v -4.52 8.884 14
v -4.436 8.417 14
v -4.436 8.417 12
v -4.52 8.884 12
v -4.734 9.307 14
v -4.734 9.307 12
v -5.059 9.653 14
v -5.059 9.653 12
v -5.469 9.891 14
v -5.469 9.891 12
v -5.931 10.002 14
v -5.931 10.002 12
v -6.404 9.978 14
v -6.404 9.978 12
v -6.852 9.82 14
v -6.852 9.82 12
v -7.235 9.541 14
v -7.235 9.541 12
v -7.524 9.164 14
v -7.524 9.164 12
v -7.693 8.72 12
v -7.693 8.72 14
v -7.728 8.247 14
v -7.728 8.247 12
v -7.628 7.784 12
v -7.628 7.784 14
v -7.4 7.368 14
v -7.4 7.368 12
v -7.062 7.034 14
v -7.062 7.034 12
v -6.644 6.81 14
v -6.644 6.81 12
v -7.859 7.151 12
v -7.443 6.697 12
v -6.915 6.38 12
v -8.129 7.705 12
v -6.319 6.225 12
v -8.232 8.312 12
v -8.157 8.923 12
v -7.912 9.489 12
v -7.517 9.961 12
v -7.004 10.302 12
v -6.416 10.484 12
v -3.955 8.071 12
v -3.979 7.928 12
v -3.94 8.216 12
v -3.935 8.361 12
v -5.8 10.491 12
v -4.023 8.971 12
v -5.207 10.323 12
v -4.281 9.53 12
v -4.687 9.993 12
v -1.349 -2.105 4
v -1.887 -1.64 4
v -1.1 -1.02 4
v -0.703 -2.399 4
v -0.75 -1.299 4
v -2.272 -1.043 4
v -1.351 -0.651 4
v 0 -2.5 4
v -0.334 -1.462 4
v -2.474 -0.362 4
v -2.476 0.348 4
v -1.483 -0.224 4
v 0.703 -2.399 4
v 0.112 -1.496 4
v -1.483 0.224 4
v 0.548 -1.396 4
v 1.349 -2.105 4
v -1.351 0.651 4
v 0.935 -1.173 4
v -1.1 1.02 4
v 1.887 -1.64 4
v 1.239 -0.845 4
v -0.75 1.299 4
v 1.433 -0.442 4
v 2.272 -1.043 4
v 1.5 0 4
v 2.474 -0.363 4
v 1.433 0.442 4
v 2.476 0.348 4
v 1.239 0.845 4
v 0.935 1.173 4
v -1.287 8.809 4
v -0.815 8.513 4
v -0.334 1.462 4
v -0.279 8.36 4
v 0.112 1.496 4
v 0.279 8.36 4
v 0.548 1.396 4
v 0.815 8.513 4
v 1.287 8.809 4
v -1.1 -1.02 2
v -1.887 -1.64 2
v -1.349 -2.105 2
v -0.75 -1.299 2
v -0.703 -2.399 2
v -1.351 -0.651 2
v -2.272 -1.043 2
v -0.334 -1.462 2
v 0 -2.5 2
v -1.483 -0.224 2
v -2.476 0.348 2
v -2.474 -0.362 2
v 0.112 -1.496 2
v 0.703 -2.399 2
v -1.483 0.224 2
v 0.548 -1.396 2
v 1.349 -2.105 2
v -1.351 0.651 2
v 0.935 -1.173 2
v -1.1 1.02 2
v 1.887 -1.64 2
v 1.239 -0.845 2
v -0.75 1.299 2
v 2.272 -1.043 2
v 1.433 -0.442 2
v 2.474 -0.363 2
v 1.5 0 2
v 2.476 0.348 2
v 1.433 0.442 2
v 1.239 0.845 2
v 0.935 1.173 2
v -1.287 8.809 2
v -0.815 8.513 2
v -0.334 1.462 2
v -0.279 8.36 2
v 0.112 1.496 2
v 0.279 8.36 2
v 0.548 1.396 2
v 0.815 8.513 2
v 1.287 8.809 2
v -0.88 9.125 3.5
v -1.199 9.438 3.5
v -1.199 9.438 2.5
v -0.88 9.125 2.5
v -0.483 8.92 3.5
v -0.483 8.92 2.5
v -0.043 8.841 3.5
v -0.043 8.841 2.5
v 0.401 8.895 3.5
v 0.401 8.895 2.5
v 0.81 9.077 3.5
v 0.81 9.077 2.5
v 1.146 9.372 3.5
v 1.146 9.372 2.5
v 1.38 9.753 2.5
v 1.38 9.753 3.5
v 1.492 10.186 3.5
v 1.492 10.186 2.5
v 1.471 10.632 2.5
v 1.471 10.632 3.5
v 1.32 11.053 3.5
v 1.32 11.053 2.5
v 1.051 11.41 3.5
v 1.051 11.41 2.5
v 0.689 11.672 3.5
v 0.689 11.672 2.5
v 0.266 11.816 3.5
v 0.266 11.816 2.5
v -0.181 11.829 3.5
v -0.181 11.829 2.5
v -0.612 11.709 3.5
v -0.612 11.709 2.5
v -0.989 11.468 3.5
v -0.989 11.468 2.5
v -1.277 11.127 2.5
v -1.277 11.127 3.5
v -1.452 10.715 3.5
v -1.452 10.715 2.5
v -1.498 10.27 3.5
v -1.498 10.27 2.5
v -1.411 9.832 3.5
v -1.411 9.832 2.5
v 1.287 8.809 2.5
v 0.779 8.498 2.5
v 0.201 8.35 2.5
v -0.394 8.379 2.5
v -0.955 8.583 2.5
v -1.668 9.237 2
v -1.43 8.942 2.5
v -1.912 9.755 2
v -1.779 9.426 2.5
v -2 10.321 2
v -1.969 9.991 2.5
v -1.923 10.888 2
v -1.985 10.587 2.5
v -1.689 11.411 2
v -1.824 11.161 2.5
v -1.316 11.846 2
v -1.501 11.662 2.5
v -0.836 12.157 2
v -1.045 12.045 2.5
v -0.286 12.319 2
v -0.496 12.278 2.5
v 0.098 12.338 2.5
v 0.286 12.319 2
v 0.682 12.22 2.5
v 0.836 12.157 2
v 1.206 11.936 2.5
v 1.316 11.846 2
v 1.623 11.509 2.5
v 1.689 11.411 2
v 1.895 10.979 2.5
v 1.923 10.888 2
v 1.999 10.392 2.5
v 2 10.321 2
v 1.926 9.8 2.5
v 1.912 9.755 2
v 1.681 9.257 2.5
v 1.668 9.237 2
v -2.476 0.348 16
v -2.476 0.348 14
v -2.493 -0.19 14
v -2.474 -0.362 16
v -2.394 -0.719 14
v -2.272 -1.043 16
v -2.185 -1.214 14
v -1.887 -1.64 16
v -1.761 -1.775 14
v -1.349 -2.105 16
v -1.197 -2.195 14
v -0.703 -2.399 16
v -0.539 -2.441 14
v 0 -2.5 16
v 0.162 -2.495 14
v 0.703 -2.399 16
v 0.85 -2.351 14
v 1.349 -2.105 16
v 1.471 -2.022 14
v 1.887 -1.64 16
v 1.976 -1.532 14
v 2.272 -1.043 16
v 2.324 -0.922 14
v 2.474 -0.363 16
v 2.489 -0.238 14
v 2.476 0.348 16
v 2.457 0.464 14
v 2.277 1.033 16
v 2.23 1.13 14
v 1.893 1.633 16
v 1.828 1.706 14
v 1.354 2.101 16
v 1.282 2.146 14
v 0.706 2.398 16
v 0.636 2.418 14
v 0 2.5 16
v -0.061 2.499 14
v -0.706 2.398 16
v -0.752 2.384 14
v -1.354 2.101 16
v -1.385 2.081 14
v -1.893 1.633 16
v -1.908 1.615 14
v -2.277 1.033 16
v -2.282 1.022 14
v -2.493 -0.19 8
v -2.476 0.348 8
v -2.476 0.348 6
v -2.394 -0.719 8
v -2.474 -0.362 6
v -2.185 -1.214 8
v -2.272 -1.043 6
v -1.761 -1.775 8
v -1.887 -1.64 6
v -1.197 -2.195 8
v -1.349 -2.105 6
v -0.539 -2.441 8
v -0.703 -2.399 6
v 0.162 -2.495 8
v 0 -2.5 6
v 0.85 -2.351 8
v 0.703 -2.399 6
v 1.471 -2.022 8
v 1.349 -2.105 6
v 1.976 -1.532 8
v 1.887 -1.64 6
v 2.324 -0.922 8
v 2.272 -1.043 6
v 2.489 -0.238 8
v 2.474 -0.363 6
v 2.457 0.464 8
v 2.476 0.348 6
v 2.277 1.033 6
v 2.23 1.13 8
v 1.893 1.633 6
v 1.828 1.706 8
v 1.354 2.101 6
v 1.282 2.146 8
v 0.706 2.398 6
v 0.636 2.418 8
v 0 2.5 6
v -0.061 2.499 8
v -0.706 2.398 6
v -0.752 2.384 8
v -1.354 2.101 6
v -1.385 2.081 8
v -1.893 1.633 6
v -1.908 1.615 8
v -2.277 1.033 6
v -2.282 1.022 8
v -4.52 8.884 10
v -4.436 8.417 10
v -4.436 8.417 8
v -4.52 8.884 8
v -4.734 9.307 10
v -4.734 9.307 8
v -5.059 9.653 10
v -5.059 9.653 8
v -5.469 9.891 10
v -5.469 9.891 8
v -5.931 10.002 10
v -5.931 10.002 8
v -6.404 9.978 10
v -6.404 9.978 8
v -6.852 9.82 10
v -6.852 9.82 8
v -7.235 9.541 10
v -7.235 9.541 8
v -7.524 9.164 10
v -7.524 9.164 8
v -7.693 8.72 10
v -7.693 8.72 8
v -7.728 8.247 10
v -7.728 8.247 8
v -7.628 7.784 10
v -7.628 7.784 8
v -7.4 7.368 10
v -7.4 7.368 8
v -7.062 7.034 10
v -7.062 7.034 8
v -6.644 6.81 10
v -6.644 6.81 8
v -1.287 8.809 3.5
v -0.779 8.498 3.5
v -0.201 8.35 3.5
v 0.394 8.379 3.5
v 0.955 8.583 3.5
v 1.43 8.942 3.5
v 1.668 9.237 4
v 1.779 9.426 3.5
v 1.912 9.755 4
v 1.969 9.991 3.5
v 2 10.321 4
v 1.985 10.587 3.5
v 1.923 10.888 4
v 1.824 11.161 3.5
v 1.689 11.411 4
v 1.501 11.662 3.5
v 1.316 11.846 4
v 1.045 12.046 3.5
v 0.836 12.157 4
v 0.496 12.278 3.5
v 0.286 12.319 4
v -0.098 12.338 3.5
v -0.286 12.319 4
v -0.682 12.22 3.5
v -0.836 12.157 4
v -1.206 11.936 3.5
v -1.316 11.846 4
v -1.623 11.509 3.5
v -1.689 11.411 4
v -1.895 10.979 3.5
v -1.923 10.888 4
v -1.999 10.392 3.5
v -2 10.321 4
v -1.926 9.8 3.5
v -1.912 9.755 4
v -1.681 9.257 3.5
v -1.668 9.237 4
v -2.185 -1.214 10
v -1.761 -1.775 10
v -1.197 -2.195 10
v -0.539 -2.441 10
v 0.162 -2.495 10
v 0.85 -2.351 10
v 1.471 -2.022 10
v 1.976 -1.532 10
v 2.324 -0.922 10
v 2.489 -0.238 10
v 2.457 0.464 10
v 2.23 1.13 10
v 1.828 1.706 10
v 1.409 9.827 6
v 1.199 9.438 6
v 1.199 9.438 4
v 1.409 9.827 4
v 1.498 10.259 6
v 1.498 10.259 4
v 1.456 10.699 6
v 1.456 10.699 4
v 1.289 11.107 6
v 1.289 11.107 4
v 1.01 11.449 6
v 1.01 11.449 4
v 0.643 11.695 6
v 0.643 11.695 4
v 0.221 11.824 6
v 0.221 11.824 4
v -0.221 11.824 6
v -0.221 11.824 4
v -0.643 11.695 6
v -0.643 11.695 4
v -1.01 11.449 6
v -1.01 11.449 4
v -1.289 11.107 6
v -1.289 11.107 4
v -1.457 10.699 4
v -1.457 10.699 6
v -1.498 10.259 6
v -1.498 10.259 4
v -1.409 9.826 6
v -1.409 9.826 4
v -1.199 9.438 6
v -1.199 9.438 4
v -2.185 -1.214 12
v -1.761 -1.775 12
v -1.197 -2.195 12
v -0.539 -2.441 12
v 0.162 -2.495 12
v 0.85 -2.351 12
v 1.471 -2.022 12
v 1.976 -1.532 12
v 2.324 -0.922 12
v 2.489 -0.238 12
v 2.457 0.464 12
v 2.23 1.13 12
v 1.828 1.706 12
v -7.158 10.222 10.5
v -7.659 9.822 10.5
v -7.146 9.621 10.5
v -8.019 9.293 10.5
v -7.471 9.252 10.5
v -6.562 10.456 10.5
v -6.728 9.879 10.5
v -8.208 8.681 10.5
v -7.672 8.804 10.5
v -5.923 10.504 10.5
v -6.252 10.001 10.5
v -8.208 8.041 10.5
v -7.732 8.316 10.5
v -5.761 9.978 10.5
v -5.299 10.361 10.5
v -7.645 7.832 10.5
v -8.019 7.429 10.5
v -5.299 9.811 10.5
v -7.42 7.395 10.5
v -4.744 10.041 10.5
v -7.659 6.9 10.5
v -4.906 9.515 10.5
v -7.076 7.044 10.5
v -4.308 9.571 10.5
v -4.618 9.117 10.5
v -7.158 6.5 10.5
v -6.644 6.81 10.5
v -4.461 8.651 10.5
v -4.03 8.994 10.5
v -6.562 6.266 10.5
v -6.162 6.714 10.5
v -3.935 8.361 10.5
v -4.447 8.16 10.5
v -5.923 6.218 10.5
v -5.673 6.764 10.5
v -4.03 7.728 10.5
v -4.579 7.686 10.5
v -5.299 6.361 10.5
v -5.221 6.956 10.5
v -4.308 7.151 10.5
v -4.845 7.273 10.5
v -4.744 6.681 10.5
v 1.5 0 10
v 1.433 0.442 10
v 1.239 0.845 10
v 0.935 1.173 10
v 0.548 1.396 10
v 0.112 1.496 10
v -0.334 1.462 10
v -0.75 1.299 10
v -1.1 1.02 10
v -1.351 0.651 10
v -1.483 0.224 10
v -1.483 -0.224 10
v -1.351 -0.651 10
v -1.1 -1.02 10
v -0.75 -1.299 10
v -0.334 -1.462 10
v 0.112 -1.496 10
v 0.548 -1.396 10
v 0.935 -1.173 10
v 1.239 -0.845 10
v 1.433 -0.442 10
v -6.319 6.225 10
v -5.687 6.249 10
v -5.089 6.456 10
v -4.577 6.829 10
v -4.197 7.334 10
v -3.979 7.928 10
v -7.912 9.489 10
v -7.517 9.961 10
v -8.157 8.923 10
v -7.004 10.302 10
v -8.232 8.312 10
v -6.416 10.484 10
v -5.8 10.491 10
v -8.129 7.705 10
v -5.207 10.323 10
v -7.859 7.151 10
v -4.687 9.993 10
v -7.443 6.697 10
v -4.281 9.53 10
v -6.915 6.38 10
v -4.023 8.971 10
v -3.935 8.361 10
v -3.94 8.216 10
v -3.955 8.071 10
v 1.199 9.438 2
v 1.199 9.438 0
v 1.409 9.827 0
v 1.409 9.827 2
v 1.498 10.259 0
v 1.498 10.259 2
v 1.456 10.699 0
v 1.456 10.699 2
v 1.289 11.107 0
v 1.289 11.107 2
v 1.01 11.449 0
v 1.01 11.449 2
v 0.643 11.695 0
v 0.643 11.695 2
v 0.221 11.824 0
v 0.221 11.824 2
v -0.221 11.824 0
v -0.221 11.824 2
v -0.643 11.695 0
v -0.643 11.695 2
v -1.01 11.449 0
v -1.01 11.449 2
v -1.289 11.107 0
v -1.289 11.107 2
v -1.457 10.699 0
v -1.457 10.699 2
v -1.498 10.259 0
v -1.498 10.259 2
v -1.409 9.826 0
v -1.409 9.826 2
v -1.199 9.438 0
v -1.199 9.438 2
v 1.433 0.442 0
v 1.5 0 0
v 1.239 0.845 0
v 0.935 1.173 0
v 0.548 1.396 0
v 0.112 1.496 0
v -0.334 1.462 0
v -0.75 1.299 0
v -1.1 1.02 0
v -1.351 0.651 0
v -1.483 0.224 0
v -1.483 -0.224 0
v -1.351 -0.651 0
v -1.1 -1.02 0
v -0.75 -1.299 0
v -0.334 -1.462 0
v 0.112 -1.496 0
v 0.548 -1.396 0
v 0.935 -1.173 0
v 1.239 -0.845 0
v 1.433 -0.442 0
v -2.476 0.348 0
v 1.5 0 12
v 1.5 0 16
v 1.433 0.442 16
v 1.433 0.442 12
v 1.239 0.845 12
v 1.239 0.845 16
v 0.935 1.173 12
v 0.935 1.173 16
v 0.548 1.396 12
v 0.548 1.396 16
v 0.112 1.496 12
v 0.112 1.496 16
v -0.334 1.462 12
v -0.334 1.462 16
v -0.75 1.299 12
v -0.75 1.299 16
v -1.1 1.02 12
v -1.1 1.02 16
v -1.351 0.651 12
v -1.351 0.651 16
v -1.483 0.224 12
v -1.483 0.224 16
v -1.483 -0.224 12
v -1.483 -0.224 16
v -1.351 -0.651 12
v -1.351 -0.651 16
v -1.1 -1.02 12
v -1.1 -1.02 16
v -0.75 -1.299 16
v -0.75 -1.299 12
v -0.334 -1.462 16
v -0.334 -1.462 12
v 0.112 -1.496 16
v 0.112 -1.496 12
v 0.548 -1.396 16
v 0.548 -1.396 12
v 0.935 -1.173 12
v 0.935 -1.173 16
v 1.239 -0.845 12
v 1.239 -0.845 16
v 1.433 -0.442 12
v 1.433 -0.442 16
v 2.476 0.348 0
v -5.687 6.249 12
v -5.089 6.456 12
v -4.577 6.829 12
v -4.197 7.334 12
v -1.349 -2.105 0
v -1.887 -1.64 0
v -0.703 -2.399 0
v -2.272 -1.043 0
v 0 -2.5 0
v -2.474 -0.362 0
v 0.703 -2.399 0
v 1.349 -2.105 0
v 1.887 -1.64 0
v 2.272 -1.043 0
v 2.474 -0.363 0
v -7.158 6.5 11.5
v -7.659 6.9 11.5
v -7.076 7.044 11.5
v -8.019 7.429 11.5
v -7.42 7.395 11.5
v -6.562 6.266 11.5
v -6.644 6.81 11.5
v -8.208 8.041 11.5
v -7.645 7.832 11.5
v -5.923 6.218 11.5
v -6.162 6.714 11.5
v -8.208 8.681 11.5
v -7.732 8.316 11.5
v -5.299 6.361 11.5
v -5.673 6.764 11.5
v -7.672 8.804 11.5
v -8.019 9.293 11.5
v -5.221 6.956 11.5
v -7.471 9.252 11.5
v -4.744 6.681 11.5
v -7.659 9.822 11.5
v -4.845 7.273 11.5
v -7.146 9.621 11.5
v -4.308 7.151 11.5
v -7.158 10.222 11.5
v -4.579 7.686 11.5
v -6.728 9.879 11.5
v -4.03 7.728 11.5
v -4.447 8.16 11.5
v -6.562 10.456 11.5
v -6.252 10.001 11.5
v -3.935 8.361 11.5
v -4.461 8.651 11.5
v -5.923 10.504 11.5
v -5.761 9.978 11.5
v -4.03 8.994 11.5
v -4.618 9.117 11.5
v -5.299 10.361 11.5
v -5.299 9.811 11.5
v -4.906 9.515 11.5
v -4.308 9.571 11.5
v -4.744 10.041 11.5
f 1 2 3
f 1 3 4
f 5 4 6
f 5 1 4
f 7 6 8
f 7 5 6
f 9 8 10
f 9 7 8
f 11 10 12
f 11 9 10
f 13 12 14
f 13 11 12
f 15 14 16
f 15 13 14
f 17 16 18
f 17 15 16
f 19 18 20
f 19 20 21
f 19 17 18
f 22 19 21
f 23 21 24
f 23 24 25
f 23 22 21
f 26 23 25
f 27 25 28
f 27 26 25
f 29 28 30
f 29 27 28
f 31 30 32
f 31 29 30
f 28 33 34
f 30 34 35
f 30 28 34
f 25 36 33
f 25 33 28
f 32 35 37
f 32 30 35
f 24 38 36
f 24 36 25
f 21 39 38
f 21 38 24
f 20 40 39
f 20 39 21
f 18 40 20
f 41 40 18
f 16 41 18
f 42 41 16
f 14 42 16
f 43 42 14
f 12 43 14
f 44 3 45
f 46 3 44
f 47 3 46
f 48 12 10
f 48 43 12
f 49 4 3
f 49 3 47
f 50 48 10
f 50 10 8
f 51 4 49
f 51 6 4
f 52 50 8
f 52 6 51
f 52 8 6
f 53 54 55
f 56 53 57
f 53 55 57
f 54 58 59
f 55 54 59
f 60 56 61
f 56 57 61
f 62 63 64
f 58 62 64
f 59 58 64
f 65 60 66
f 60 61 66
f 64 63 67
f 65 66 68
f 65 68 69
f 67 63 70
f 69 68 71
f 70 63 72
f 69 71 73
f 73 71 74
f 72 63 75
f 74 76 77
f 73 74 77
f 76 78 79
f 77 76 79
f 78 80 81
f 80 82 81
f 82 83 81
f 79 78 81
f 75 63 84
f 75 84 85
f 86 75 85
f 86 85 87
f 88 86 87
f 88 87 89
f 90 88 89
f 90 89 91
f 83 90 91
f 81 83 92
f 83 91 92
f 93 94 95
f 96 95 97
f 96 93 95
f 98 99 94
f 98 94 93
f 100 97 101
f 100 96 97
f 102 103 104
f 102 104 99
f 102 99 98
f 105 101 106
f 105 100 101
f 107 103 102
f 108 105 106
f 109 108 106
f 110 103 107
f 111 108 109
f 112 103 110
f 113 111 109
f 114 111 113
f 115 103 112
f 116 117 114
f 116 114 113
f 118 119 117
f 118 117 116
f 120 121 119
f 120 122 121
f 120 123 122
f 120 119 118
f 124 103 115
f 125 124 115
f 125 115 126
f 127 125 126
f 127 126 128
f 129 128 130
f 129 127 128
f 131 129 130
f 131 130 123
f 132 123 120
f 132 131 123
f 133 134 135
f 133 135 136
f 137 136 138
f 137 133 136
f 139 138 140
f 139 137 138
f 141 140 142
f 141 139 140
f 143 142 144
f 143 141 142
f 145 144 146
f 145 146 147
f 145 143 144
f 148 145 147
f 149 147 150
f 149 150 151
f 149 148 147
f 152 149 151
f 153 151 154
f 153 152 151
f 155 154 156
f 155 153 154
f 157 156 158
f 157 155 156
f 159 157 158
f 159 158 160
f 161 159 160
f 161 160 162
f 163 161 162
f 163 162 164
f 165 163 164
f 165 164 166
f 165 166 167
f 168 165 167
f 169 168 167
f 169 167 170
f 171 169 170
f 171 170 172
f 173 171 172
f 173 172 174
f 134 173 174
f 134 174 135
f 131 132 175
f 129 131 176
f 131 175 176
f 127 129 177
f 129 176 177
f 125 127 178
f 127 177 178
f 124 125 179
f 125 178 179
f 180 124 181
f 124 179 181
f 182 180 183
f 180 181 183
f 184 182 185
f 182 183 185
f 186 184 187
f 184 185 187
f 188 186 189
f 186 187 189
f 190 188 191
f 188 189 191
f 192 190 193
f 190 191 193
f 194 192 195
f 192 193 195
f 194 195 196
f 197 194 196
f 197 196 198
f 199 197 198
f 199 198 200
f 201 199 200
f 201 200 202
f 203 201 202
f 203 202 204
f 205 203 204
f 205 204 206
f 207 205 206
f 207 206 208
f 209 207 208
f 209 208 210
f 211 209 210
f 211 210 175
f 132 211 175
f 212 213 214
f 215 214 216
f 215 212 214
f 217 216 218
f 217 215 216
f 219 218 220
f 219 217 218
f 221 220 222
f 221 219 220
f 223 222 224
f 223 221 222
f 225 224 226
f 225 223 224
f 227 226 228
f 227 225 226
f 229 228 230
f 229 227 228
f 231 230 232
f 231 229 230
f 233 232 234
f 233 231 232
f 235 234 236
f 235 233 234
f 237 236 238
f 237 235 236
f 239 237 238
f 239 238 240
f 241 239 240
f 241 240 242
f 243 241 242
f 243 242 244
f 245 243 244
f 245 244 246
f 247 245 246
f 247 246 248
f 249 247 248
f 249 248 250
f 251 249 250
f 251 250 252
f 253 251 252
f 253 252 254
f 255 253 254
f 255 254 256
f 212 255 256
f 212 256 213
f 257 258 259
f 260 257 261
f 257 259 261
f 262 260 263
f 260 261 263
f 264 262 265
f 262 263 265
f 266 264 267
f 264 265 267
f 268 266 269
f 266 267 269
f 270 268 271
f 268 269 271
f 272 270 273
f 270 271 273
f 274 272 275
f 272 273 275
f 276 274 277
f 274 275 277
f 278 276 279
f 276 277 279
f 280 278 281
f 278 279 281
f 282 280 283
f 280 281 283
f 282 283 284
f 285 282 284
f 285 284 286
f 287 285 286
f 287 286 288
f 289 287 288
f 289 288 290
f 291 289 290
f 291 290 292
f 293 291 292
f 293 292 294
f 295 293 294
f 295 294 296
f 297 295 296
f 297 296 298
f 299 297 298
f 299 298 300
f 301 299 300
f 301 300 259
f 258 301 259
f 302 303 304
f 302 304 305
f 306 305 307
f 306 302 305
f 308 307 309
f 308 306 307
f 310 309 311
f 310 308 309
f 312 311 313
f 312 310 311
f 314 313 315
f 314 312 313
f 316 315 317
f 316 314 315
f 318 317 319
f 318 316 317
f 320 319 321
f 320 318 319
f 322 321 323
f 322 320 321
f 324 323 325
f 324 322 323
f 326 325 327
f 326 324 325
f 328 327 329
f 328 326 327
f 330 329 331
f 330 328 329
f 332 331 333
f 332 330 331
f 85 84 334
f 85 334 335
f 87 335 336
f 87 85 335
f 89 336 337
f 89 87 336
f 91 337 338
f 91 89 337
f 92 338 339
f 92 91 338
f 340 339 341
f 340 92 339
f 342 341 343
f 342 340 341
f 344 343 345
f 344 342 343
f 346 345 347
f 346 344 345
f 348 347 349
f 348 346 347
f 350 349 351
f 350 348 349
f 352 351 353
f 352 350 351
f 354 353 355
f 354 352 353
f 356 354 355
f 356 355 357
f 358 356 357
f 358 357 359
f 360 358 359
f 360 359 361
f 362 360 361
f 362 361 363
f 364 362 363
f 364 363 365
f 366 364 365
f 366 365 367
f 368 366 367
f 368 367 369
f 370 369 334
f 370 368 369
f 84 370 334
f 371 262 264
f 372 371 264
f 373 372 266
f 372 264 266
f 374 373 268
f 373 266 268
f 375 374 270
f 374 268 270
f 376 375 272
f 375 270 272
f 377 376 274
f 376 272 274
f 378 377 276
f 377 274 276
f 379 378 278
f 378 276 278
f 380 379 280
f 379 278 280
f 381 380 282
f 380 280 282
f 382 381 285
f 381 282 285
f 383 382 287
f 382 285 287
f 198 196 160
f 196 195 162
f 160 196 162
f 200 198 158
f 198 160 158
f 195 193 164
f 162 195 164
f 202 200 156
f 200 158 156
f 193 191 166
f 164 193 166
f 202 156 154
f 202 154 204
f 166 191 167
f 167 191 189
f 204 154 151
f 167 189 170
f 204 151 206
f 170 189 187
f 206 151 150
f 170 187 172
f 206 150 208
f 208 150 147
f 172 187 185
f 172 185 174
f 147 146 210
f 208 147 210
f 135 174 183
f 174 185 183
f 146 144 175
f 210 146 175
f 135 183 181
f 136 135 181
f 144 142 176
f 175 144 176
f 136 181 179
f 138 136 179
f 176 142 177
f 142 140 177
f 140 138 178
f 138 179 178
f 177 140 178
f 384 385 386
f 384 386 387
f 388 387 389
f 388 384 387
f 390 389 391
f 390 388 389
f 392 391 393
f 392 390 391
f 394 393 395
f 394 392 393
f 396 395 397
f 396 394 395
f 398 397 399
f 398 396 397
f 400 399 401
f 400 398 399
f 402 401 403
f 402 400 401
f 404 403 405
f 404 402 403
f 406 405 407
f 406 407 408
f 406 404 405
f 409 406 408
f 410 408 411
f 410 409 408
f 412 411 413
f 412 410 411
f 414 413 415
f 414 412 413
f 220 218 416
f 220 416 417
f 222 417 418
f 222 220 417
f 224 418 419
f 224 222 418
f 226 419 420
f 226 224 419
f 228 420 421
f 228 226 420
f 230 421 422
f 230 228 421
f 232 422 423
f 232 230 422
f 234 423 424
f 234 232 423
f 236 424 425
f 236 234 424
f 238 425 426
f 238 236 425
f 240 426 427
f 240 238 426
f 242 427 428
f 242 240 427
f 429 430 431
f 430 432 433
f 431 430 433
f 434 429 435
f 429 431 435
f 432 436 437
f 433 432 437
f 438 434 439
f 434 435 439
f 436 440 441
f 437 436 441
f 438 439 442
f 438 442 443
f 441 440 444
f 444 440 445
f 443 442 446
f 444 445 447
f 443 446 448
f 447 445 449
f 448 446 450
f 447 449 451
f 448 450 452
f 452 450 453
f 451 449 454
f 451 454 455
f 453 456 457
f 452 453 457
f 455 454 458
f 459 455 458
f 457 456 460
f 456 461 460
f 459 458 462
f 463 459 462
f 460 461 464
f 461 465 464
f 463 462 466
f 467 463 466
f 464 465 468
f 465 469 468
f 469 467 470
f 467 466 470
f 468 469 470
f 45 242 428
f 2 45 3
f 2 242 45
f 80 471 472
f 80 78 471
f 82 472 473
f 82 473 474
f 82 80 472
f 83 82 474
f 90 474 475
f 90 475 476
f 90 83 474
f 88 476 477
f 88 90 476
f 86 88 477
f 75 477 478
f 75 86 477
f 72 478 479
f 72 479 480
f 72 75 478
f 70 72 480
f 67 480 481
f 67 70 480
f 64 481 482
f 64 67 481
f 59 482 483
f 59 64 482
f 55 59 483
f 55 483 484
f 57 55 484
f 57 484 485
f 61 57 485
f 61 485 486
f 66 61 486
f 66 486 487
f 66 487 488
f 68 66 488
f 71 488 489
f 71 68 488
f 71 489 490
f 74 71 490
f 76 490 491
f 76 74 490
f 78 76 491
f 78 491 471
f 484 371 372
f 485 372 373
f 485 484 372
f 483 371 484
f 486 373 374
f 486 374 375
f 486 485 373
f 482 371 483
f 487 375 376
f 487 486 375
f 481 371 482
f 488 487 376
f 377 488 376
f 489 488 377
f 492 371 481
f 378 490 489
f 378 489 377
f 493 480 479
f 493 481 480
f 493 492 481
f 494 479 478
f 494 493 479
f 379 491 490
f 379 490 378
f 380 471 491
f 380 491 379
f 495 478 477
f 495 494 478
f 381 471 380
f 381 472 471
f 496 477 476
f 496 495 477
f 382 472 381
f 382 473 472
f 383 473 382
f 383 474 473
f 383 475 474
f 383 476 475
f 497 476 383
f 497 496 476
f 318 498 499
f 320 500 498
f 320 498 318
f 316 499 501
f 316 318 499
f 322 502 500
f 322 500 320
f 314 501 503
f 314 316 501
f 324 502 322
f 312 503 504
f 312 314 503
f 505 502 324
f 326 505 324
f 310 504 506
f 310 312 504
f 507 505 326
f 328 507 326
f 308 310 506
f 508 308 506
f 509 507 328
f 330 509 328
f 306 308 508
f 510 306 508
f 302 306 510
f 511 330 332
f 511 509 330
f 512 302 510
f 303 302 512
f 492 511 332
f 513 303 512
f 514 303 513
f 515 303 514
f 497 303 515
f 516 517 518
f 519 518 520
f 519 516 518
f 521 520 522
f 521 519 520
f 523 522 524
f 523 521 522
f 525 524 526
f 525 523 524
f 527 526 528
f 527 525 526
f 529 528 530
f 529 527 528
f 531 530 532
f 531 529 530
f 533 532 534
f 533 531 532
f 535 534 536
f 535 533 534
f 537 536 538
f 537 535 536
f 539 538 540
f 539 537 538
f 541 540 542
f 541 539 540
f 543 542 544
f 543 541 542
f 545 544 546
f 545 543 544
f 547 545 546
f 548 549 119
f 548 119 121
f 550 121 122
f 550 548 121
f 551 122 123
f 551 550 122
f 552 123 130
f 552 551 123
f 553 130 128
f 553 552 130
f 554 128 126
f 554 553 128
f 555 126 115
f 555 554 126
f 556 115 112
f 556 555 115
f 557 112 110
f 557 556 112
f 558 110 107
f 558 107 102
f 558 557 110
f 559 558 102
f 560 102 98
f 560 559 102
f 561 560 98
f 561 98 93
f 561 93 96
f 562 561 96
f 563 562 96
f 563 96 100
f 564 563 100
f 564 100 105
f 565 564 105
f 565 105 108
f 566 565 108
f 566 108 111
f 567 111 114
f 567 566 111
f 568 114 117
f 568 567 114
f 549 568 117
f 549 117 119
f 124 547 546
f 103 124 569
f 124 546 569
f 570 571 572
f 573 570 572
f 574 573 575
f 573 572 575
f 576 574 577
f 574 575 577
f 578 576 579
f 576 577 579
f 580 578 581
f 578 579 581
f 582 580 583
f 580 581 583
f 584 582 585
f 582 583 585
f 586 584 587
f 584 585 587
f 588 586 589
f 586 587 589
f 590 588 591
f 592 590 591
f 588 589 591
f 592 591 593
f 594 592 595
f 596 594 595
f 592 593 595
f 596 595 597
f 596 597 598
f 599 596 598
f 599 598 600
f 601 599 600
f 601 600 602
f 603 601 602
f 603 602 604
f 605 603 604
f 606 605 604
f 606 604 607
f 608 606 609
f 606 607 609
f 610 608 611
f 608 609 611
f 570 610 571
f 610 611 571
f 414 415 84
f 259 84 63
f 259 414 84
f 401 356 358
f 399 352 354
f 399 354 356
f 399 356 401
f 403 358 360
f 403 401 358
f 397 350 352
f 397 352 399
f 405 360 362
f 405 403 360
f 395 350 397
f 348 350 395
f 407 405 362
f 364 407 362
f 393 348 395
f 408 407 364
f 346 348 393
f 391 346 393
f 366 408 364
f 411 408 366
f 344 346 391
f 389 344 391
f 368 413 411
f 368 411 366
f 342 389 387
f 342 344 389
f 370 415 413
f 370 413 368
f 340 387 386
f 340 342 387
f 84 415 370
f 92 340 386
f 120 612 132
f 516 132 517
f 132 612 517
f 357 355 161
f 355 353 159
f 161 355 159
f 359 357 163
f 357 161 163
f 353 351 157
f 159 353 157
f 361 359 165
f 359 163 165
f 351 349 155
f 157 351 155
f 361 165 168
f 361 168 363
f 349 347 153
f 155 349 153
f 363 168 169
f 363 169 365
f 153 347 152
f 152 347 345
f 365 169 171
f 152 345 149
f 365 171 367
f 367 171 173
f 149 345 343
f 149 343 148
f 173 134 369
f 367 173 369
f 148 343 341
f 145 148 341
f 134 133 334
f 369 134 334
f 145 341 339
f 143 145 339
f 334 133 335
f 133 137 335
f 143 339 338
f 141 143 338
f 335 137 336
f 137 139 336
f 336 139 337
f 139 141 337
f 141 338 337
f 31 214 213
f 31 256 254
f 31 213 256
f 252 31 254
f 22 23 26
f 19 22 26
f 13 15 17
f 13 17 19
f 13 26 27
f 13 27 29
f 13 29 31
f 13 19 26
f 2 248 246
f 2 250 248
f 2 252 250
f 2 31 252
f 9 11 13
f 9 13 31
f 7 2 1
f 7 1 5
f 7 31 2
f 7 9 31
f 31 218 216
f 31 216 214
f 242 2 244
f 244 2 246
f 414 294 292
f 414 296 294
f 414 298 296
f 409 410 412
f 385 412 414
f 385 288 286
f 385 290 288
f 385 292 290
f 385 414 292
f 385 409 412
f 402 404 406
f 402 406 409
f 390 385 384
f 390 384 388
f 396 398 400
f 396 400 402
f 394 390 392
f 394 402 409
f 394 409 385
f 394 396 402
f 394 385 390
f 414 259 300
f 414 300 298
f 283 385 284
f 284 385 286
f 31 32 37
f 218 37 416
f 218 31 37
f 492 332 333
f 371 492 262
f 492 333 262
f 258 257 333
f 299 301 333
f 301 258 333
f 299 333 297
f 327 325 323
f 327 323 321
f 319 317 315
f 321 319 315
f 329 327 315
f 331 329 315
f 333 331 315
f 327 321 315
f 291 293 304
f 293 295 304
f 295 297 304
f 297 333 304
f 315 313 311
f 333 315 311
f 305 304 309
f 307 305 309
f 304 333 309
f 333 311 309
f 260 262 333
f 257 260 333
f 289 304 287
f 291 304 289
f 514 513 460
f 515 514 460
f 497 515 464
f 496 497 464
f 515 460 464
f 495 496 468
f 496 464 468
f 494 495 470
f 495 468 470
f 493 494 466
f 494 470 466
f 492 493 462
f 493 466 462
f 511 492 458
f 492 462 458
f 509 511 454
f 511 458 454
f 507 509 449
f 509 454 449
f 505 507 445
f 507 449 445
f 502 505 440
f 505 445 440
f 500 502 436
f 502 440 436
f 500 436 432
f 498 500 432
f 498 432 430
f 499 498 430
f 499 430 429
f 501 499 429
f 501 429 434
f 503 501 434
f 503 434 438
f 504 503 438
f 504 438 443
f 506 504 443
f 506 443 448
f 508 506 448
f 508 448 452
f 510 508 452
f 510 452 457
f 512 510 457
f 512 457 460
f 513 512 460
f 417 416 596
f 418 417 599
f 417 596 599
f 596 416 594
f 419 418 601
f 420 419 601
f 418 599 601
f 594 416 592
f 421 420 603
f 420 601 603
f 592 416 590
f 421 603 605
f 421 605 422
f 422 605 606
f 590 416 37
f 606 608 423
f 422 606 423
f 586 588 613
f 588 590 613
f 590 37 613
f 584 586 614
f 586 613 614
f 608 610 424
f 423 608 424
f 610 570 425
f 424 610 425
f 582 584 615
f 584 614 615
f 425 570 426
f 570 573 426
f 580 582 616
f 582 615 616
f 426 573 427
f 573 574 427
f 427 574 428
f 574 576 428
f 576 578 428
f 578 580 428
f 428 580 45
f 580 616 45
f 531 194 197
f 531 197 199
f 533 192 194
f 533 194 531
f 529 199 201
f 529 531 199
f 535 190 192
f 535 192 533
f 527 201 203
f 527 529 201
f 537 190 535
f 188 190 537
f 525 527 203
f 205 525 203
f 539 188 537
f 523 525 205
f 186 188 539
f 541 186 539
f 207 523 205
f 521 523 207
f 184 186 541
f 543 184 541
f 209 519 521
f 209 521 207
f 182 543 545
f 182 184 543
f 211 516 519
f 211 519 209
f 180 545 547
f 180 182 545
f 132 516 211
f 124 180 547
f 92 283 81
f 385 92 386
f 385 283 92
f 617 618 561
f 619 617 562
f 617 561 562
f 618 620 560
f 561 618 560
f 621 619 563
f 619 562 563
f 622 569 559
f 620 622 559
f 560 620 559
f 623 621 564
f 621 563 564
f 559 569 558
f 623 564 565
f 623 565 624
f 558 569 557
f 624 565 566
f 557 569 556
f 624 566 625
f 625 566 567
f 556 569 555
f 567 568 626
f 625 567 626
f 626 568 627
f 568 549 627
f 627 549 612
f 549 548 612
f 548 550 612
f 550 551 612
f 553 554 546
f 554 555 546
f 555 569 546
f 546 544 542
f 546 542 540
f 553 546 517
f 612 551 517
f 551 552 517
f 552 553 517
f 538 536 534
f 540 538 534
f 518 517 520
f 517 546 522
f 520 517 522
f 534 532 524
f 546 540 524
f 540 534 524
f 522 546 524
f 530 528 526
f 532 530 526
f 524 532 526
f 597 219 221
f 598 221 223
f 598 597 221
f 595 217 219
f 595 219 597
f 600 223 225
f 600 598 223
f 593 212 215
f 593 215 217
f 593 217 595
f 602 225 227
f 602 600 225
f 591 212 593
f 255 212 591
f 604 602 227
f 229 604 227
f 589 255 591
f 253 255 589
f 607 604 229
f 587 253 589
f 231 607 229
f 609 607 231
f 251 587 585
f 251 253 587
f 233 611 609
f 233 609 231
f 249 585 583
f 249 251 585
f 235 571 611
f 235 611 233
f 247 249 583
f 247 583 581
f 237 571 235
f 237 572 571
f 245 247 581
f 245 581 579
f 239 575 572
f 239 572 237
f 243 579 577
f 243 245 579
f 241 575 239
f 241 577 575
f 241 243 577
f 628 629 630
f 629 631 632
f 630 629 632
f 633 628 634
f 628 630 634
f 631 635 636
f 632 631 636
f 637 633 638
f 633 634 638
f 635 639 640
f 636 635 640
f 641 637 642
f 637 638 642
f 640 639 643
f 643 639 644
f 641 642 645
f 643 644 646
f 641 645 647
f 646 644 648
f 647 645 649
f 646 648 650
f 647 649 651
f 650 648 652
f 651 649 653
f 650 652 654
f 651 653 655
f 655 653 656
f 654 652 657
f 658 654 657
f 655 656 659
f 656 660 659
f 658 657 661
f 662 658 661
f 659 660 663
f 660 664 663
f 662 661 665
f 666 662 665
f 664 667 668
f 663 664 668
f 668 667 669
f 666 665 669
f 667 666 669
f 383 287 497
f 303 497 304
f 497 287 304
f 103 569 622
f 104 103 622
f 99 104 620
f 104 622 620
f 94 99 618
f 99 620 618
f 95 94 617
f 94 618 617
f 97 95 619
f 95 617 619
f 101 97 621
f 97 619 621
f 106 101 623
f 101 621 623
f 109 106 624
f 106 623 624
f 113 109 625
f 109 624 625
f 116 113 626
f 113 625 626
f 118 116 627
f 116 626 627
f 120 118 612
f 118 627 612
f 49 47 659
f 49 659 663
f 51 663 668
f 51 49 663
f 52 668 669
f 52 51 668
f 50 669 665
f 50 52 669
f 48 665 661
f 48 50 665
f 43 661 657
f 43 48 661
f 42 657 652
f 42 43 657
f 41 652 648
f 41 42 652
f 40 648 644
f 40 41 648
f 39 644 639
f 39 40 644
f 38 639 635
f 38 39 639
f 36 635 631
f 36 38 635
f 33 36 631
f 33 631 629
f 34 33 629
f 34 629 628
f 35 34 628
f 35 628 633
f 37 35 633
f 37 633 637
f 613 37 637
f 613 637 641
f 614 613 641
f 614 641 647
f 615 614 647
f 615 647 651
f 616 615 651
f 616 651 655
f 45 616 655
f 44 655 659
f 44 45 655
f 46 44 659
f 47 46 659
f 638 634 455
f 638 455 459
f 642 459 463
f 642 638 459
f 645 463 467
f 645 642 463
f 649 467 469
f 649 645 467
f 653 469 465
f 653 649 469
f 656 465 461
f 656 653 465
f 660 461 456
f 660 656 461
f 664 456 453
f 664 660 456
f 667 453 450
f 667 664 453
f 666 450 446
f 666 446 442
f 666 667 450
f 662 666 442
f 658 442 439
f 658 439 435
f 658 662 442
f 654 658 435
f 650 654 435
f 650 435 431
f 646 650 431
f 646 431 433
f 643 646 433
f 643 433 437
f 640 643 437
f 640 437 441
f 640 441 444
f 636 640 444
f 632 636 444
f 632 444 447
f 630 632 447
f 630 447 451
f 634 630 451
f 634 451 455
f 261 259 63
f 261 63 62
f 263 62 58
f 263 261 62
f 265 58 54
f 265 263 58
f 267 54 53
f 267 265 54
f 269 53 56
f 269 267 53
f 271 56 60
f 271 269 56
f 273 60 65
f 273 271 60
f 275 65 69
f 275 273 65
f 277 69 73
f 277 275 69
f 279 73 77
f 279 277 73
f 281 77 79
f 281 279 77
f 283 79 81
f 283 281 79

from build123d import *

# Parameters (mm, degrees)
ESBO_O1_R                = 1.5
RESSALTO_EXTRUS_O1_DEPTH = 2
ESBO_O2_R                = 1.5
RESSALTO_EXTRUS_O2_DEPTH = 1
ESBO_O4_R                = 2.5
ESBO_O4_R_2              = 1.5
RESSALTO_EXTRUS_O3_DEPTH = 2
ESBO_O5_R                = 1.5
RESSALTO_EXTRUS_O4_DEPTH = 2
ESBO_O6_R                = 1.648621548
RESSALTO_EXTRUS_O5_DEPTH = 1
ESBO_O7_W                = 11.938868243
ESBO_O7_H                = 15.738508052
CORTE_EXTRUS_O1_DEPTH    = 6
RESSALTO_EXTRUS_O6_START = -2
ESBO_O8_R                = 2.148621548
RESSALTO_EXTRUS_O6_DEPTH = 0.5
RESSALTO_EXTRUS_O7_START = -2.5
ESBO_O9_R                = 2.148621548
RESSALTO_EXTRUS_O7_DEPTH = 0.5
RESSALTO_EXTRUS_O8_START = -2.5
ESBO_O10_R               = 2
RESSALTO_EXTRUS_O8_DEPTH = 0.5
RESSALTO_EXTRUS_O9_START = -2
ESBO_O11_R               = 2
RESSALTO_EXTRUS_O9_DEPTH = 0.5


with BuildPart() as part:
    # Esboço1 → Ressalto-extrusão1 (new body)
    with BuildSketch(Plane.XY):
        with BuildLine():
            Line((-1.198777863, 9.438372785), (-2.475695902, 0.347749621))
            ThreePointArc((-2.475695902, 0.347749621), (-1.4263e-05, -2.5), (2.47569987, 0.347721373))
            Line((2.47569987, 0.347721373), (1.198866989, 9.438491296))
            ThreePointArc((1.198866989, 9.438491296), (-7.4142e-05, 11.839999998), (-1.198777863, 9.438372785))
        make_face()
        Circle(ESBO_O1_R, mode=Mode.SUBTRACT)
    extrude(amount=RESSALTO_EXTRUS_O1_DEPTH)

    # Esboço2 → Ressalto-extrusão2 (add)
    with BuildSketch(Plane.XY.offset(2)):
        with Locations(Location((0, 10.34, 0), (0, 0, 216.947631019))):
            Circle(ESBO_O2_R)
    extrude(amount=RESSALTO_EXTRUS_O2_DEPTH)

    # Espelhar1: part across plane


with BuildPart() as part_1:
    add(part.part)
    add(part.part.mirror(Plane(origin=(0, 10.34, 3), x_dir=(1, 0, 0), z_dir=(0, 0, 1))))

    # Esboço4 → Ressalto-extrusão3 (add)
    with BuildSketch(Plane.XY.offset(6)):
        with Locations(Location((0, 0, 0), (0, 0, 172.004238293))):
            Circle(ESBO_O4_R)
        Circle(ESBO_O4_R_2, mode=Mode.SUBTRACT)
    extrude(amount=RESSALTO_EXTRUS_O3_DEPTH)

    # Esboço5 → Ressalto-extrusão4 (add)
    with BuildSketch(Plane.XY.offset(8)):
        with BuildLine():
            Line((-6.643819561, 6.810437698), (-2.18535321, -1.21417929))
            ThreePointArc((-2.18535321, -1.21417929), (1.470887432, -2.021506904), (1.827663155, 1.705768857))
            Line((1.827663155, 1.705768857), (-4.435920088, 8.416947961))
            ThreePointArc((-4.435920088, 8.416947961), (-7.053565106, 9.69403249), (-6.643819561, 6.810437698))
        make_face()
        Circle(ESBO_O5_R, mode=Mode.SUBTRACT)
    extrude(amount=RESSALTO_EXTRUS_O4_DEPTH)

    # Esboço6 → Ressalto-extrusão5 (add)
    with BuildSketch(Plane.XY.offset(10)):
        with Locations(Location((-6.08359042, 8.360952554, 0), (0, 0, 250.134292883))):
            Circle(ESBO_O6_R)
    extrude(amount=RESSALTO_EXTRUS_O5_DEPTH)

    # Espelhar3: part across plane


with BuildPart() as part_2:
    add(part_1.part)
    add(part_1.part.mirror(Plane(origin=(-6.08359042, 8.360952554, 11), x_dir=(1, 0, 0), z_dir=(0, 0, 1))))

    # Esboço7 → Corte-extrusão1 (cut)
    with BuildSketch(Plane.XY.offset(22)):
        with Locations((-0.266328734, 4.470018957)):
            Rectangle(ESBO_O7_W, ESBO_O7_H)
    extrude(amount=-CORTE_EXTRUS_O1_DEPTH, mode=Mode.SUBTRACT)

    # Esboço8 → Ressalto-extrusão6 (add)
    with BuildSketch(Plane.XY.offset(14).offset(RESSALTO_EXTRUS_O6_START)):
        with Locations((-6.08359042, 8.360952554)):
            Circle(ESBO_O8_R)
    extrude(amount=-RESSALTO_EXTRUS_O6_DEPTH)

    # Esboço9 → Ressalto-extrusão7 (add)
    with BuildSketch(Plane(origin=(0, 0, 8), x_dir=(-1, 0, 0), z_dir=(0, 0, -1)).offset(RESSALTO_EXTRUS_O7_START)):
        with Locations(Location((6.08359042, 8.360952554, 0), (0, 0, 180))):
            Circle(ESBO_O9_R)
    extrude(amount=RESSALTO_EXTRUS_O7_DEPTH)

    # Esboço10 → Ressalto-extrusão8 (add)
    with BuildSketch(Plane(origin=(0, 0, 0), x_dir=(-1, 0, 0), z_dir=(0, 0, -1)).offset(RESSALTO_EXTRUS_O8_START)):
        with Locations(Location((0, 10.34, 0), (0, 0, 229.937782743))):
            Circle(ESBO_O10_R)
    extrude(amount=RESSALTO_EXTRUS_O8_DEPTH)

    # Esboço11 → Ressalto-extrusão9 (add)
    with BuildSketch(Plane.XY.offset(6).offset(RESSALTO_EXTRUS_O9_START)):
        with Locations(Location((0, 10.34, 0), (0, 0, 229.941078536))):
            Circle(ESBO_O11_R)
    extrude(amount=-RESSALTO_EXTRUS_O9_DEPTH)


solid = part_2.part
